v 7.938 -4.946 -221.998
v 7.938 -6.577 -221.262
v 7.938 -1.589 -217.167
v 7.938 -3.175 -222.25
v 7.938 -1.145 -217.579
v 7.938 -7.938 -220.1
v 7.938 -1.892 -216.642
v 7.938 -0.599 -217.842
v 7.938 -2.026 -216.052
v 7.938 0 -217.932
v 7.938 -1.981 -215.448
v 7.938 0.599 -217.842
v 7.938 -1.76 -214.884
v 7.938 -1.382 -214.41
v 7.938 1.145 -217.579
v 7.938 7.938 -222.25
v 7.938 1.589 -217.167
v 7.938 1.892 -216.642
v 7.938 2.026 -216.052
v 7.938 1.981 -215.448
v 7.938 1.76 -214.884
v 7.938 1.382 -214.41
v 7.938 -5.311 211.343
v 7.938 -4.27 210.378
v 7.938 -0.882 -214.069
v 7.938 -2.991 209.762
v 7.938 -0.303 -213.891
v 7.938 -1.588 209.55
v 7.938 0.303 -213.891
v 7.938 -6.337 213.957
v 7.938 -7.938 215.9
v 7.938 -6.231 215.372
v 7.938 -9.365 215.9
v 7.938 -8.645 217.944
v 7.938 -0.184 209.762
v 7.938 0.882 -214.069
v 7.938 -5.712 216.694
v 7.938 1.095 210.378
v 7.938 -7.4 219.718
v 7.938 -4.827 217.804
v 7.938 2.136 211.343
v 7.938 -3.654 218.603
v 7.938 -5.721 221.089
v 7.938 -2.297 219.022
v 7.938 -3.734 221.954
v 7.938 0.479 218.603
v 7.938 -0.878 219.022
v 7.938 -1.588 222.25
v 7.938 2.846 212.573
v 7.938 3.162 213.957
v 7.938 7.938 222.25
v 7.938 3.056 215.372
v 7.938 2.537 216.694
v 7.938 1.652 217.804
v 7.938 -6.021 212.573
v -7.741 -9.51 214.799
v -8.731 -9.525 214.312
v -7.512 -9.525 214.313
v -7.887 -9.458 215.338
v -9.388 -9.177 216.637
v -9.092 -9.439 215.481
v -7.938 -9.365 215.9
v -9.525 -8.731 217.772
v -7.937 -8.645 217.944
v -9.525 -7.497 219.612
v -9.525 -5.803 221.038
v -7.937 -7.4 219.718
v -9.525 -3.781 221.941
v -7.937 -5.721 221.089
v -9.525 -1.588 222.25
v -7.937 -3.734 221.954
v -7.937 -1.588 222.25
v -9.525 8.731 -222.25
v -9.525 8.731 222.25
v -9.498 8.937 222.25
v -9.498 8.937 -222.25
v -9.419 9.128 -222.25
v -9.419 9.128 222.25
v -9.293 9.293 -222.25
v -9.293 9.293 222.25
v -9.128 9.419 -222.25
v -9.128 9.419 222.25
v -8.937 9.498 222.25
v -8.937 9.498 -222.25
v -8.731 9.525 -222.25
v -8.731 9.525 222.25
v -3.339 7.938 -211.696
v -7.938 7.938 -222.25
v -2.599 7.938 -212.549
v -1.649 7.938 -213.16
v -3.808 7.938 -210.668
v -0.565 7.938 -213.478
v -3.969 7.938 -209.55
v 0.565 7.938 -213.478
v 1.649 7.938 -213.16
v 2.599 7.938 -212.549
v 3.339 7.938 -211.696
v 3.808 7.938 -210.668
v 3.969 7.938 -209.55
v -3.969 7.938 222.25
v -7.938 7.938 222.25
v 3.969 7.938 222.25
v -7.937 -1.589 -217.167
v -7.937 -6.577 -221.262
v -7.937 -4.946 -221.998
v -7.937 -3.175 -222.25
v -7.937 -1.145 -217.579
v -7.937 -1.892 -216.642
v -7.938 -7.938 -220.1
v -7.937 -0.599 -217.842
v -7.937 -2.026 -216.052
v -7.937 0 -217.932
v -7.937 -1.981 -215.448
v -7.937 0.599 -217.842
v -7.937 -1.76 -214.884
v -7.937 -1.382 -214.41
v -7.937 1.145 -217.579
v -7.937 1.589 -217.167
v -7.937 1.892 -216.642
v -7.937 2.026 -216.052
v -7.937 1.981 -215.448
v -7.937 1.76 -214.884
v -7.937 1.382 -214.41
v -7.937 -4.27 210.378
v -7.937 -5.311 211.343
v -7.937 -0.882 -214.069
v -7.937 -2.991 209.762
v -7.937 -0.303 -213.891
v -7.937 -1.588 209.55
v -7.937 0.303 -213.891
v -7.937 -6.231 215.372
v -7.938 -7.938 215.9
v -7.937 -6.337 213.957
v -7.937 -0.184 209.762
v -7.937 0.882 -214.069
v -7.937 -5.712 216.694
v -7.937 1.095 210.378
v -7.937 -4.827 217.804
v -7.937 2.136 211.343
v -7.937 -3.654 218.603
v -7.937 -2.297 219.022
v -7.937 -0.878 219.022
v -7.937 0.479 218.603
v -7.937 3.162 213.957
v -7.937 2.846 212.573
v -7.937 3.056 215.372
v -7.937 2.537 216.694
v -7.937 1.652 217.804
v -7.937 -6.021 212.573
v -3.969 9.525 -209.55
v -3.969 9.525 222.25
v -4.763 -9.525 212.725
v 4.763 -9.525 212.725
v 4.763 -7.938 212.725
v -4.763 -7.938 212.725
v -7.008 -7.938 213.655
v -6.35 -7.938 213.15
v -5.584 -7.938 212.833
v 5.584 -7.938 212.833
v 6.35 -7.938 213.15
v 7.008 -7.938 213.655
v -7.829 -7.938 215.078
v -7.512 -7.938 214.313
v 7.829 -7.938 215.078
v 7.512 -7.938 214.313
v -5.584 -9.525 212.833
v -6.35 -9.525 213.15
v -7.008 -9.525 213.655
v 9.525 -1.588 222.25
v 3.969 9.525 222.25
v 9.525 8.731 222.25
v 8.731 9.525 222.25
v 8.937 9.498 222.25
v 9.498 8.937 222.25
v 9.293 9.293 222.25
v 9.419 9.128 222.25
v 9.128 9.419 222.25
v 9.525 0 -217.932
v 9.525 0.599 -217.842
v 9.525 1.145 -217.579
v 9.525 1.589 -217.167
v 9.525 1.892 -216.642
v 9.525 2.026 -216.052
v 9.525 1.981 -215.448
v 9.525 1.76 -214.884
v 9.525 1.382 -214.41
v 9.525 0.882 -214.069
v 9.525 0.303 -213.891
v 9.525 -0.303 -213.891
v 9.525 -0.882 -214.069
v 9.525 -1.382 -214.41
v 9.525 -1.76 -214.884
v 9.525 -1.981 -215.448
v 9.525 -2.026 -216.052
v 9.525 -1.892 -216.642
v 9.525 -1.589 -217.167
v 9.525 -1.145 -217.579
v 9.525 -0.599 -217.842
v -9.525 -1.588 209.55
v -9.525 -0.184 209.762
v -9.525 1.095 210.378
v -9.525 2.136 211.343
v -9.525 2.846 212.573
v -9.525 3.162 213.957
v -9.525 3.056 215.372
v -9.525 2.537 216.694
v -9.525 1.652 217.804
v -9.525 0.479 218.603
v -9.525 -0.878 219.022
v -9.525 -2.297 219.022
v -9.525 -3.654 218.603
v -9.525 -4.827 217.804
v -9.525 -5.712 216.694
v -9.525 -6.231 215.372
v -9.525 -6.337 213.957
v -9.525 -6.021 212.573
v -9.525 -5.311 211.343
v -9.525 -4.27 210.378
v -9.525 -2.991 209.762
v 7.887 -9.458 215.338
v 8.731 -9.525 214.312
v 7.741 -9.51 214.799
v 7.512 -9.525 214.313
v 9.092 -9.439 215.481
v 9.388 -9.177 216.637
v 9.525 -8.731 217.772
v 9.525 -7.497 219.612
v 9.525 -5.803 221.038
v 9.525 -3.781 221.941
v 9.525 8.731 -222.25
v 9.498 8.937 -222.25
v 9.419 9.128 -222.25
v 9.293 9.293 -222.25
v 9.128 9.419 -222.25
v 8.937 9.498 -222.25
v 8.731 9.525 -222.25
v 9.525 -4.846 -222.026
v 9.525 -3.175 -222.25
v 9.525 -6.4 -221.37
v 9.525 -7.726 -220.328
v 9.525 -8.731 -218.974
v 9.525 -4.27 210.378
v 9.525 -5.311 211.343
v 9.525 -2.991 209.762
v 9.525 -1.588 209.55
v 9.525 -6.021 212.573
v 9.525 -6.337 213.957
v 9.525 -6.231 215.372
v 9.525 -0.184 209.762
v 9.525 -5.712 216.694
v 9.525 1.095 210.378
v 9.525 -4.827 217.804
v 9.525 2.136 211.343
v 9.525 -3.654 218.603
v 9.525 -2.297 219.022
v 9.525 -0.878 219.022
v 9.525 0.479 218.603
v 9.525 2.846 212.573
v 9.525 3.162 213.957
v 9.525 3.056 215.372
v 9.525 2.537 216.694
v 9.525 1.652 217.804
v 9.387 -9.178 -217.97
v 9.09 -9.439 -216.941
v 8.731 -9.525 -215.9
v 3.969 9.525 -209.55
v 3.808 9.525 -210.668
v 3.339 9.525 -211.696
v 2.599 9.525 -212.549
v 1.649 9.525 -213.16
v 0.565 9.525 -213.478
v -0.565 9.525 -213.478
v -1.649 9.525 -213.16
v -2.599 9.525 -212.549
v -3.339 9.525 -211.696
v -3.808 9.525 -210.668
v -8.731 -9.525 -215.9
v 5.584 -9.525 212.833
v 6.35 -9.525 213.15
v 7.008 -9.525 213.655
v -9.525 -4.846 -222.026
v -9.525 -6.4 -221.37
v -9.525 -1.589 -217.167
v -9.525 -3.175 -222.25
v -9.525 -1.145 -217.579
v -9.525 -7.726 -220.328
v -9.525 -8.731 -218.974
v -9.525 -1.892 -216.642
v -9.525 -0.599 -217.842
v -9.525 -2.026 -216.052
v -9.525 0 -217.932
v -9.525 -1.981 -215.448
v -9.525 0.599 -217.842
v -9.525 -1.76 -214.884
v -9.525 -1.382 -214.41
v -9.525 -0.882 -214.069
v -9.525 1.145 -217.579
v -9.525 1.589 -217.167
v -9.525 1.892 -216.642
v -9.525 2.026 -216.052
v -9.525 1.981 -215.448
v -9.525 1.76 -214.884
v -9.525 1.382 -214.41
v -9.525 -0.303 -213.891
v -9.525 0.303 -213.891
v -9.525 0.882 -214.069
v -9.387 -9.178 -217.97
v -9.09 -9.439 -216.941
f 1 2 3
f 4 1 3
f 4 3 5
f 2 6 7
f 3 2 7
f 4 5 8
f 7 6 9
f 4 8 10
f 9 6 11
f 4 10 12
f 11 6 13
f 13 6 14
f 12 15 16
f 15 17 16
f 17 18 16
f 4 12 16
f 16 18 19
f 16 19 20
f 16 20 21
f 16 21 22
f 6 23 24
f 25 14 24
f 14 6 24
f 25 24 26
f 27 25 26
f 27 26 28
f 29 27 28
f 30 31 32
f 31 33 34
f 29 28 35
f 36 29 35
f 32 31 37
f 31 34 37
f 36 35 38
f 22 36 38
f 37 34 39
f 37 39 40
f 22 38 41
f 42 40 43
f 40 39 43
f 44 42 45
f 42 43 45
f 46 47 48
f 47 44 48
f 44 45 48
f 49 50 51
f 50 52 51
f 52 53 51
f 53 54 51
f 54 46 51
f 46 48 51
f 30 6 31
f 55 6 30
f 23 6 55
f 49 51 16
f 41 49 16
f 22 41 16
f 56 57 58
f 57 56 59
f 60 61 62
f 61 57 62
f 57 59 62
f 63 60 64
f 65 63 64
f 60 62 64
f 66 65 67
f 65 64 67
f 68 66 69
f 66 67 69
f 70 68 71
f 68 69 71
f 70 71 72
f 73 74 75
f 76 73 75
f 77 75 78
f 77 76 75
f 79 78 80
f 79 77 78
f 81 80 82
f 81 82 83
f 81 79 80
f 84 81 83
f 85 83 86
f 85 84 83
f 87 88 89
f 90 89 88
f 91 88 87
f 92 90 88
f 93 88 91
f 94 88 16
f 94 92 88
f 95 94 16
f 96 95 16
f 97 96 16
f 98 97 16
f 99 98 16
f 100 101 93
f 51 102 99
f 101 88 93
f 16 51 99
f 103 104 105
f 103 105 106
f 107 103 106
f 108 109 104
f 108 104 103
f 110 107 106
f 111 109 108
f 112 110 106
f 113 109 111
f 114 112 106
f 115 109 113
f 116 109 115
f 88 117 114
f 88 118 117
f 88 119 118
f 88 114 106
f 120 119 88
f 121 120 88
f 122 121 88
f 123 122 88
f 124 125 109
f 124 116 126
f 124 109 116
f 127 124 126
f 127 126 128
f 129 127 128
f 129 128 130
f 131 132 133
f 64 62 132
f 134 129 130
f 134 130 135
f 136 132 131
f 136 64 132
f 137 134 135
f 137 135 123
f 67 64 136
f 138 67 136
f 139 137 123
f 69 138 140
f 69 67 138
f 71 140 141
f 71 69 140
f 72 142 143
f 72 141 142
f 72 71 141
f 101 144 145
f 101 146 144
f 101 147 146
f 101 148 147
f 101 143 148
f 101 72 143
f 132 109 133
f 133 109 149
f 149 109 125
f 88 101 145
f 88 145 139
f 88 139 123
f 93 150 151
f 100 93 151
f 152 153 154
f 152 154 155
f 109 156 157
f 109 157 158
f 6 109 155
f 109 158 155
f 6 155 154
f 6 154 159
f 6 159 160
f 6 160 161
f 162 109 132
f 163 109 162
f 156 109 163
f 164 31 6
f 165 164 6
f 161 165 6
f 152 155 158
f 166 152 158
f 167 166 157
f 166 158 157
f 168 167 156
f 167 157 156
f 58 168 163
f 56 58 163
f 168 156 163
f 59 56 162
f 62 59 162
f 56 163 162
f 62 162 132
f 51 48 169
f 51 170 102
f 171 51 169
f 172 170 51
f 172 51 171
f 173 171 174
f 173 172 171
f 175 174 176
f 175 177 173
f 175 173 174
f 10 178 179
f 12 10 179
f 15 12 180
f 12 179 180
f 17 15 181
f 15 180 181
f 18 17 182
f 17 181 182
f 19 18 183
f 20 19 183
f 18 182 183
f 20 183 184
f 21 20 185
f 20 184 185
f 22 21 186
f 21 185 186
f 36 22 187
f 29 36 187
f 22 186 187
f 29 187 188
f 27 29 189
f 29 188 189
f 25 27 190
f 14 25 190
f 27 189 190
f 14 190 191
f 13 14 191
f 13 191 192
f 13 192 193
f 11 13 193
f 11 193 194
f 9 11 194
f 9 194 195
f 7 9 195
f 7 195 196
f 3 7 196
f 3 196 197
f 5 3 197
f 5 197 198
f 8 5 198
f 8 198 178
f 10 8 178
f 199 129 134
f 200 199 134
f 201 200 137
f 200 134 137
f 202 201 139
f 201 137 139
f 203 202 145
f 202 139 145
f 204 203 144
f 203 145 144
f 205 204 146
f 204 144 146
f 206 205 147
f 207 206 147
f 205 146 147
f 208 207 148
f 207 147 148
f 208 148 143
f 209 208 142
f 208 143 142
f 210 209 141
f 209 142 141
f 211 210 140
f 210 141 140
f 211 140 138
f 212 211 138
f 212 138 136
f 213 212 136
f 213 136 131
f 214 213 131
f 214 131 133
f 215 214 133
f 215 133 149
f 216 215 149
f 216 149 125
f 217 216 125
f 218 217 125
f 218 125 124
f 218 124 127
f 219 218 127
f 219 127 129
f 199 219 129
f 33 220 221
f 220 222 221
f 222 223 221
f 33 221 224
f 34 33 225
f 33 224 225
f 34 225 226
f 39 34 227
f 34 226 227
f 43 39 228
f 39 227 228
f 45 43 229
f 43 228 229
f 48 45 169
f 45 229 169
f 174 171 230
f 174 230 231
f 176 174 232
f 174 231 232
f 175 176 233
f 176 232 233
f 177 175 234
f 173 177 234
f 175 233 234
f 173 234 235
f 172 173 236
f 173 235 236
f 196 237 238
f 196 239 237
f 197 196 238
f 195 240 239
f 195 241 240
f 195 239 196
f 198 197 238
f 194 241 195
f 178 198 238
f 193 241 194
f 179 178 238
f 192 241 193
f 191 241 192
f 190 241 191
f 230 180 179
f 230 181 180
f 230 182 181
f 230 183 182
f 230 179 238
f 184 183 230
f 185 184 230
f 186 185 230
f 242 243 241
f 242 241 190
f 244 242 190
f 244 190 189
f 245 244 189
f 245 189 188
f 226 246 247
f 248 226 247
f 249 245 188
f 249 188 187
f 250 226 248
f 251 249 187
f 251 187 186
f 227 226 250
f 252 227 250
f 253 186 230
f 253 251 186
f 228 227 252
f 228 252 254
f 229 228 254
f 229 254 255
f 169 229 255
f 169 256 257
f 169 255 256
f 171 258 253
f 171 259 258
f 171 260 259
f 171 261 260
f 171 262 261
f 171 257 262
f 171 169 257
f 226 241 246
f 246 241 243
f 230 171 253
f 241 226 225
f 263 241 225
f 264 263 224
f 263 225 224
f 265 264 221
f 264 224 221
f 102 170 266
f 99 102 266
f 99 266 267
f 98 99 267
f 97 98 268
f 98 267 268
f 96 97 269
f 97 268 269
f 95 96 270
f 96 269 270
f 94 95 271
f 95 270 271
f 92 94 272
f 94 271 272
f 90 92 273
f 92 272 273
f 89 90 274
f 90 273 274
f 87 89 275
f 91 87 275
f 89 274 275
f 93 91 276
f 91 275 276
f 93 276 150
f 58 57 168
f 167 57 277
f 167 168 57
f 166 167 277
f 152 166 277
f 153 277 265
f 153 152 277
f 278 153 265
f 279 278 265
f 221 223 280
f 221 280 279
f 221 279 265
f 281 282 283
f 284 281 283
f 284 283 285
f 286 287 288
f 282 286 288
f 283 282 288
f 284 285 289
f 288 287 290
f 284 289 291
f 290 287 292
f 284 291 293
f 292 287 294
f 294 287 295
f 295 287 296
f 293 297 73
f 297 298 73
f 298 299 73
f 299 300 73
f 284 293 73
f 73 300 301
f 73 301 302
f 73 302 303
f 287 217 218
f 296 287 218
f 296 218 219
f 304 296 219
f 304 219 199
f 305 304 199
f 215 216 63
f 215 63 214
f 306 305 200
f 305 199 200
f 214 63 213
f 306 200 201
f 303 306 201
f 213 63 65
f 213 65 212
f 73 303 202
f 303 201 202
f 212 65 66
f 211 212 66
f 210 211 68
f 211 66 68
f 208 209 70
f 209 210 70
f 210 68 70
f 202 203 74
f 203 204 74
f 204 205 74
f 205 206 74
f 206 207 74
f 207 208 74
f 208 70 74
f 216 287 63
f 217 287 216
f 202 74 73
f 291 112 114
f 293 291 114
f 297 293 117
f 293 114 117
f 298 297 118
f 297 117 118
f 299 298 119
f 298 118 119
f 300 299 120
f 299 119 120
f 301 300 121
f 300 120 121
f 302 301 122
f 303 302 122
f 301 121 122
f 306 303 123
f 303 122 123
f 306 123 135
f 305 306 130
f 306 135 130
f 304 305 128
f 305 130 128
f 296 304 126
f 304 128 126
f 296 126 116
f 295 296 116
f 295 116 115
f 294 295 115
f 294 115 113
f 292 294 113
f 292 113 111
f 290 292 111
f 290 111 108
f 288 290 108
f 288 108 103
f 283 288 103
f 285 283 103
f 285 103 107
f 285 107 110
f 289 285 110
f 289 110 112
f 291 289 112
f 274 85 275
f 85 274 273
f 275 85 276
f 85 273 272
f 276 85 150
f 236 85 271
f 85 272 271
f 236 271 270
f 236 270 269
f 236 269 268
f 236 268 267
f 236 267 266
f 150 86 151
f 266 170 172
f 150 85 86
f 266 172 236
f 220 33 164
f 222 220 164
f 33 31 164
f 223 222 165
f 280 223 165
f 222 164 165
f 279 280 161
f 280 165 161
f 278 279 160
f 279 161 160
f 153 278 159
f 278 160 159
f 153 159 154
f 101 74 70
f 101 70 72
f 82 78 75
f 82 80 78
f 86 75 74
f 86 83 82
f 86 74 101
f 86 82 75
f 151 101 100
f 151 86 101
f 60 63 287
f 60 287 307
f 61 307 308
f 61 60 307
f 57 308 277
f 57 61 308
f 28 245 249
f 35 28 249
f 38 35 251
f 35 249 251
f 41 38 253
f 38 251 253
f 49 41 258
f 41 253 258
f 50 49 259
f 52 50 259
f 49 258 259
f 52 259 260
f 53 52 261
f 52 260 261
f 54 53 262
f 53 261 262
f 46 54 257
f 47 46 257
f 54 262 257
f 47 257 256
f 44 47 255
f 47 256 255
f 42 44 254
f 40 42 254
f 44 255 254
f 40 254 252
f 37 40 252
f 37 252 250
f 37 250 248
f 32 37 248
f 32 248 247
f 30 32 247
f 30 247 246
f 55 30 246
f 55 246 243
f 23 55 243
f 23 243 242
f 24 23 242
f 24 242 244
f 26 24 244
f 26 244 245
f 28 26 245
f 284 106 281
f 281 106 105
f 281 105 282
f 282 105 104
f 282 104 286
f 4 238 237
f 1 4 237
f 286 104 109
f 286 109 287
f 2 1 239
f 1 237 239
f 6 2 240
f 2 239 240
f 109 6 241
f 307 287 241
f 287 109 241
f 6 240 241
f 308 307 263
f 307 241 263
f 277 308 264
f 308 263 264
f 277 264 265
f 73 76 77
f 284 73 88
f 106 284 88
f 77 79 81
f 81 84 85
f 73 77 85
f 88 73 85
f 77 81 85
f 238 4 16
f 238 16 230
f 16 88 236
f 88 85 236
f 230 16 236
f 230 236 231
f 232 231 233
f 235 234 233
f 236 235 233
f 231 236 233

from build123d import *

# Parameters (mm, degrees)
SKETCH3_W           = 19.05
SKETCH3_H           = 19.05
SKETCH3_W_2         = 15.875
SKETCH3_H_2         = 15.875
BOSS_EXTRUDE1_DEPTH = 222.25
FILLET1_R           = 0.79375
CUT_EXTRUDE1_REACH  = 225.268
CUT_EXTRUDE2_REACH  = 225.268
SKETCH5_W           = 15.875
SKETCH5_H           = 9.525
FILLET2_R           = 3.175
CUT_EXTRUDE3_DEPTH  = 224.268203345
SKETCH7_R           = 4.7625
SKETCH7_R_2         = 2.032
CUT_EXTRUDE4_DEPTH  = 224.268203458
CUT_EXTRUDE5_DEPTH  = 224.268203458


with BuildPart() as part:
    # Sketch3 → Boss-Extrude1 (new, symmetric)
    with BuildSketch(Plane.XY):
        Rectangle(SKETCH3_W, SKETCH3_H)
        Rectangle(SKETCH3_W_2, SKETCH3_H_2, mode=Mode.SUBTRACT)
    extrude(amount=BOSS_EXTRUDE1_DEPTH, both=True)

    # Fillet1
    fillet1_edges = [part.edges().sort_by_distance(p)[0] for p in [
        (9.525, -9.525, 0),
        (-9.525, -9.525, 0),
        (-9.525, 9.525, 0),
        (9.525, 9.525, 0),
    ]]
    fillet(fillet1_edges, radius=FILLET1_R)

    # Sketch4 → Cut-Extrude1 (cut, up to next)
    with BuildSketch(Plane(origin=(0, 9.525, 0), x_dir=(1, 0, 0), z_dir=(0, 1, 0)), mode=Mode.PRIVATE) as cut_extrude1_sk1:
        with BuildLine():
            Line((-3.96875, 209.55), (-3.96875, -222.25))
            Line((-3.96875, -222.25), (3.96875, -222.25))
            Line((3.96875, -222.25), (3.96875, 209.55))
            ThreePointArc((3.96875, 209.55), (0, 213.51875), (-3.96875, 209.55))
        make_face()
    cut_extrude1_tool1 = extrude(cut_extrude1_sk1.sketch, amount=-CUT_EXTRUDE1_REACH, mode=Mode.PRIVATE) & part.part
    add(cut_extrude1_tool1.solids().sort_by_distance((0, 9.525, 4.790573))[0], mode=Mode.SUBTRACT)

    # Sketch5 → Cut-Extrude2 (cut, up to next)
    with BuildSketch(Plane(origin=(0, -9.525, 0), x_dir=(-1, 0, 0), z_dir=(0, -1, 0)), mode=Mode.PRIVATE) as cut_extrude2_sk1:
        with Locations((0, -217.4875)):
            Rectangle(SKETCH5_W, SKETCH5_H)
    cut_extrude2_tool1 = extrude(cut_extrude2_sk1.sketch, amount=-CUT_EXTRUDE2_REACH, mode=Mode.PRIVATE) & part.part
    add(cut_extrude2_tool1.solids().sort_by_distance((0, -9.525, 217.4875))[0], mode=Mode.SUBTRACT)

    # Fillet2
    fillet2_edges = [part.edges().sort_by_distance(p)[0] for p in [
        (-7.9375, -8.73125, 212.725),
        (7.9375, -8.73125, 212.725),
    ]]
    fillet(fillet2_edges, radius=FILLET2_R)

    # Sketch6 → Cut-Extrude3 (cut, through all)
    with BuildSketch(Plane(origin=(9.525, 0, 0), x_dir=(0, 0, -1), z_dir=(1, 0, 0))):
        with BuildLine():
            Line((-222.25, -1.5875), (-222.25, -9.525))
            Line((-222.25, -9.525), (-214.3125, -9.525))
            ThreePointArc((-214.3125, -9.525), (-219.925160076, -7.200160076), (-222.25, -1.5875))
        make_face()
    extrude(amount=-CUT_EXTRUDE3_DEPTH, mode=Mode.SUBTRACT)

    # Sketch7 → Cut-Extrude4 (cut, through all)
    with BuildSketch(Plane(origin=(9.525, 0, 0), x_dir=(0, 0, -1), z_dir=(1, 0, 0))):
        with Locations((-214.3125, -1.5875)):
            Circle(SKETCH7_R)
        with Locations((215.9, 0)):
            Circle(SKETCH7_R_2)
    extrude(amount=-CUT_EXTRUDE4_DEPTH, mode=Mode.SUBTRACT)

    # Sketch8 → Cut-Extrude5 (cut, through all)
    with BuildSketch(Plane(origin=(9.525, 0, 0), x_dir=(0, 0, -1), z_dir=(1, 0, 0))):
        with BuildLine():
            Line((215.9, -9.525), (222.25, -9.525))
            Line((222.25, -9.525), (222.25, -3.175))
            ThreePointArc((222.25, -3.175), (220.390128061, -7.665128061), (215.9, -9.525))
        make_face()
    extrude(amount=-CUT_EXTRUDE5_DEPTH, mode=Mode.SUBTRACT)


solid = part.part
